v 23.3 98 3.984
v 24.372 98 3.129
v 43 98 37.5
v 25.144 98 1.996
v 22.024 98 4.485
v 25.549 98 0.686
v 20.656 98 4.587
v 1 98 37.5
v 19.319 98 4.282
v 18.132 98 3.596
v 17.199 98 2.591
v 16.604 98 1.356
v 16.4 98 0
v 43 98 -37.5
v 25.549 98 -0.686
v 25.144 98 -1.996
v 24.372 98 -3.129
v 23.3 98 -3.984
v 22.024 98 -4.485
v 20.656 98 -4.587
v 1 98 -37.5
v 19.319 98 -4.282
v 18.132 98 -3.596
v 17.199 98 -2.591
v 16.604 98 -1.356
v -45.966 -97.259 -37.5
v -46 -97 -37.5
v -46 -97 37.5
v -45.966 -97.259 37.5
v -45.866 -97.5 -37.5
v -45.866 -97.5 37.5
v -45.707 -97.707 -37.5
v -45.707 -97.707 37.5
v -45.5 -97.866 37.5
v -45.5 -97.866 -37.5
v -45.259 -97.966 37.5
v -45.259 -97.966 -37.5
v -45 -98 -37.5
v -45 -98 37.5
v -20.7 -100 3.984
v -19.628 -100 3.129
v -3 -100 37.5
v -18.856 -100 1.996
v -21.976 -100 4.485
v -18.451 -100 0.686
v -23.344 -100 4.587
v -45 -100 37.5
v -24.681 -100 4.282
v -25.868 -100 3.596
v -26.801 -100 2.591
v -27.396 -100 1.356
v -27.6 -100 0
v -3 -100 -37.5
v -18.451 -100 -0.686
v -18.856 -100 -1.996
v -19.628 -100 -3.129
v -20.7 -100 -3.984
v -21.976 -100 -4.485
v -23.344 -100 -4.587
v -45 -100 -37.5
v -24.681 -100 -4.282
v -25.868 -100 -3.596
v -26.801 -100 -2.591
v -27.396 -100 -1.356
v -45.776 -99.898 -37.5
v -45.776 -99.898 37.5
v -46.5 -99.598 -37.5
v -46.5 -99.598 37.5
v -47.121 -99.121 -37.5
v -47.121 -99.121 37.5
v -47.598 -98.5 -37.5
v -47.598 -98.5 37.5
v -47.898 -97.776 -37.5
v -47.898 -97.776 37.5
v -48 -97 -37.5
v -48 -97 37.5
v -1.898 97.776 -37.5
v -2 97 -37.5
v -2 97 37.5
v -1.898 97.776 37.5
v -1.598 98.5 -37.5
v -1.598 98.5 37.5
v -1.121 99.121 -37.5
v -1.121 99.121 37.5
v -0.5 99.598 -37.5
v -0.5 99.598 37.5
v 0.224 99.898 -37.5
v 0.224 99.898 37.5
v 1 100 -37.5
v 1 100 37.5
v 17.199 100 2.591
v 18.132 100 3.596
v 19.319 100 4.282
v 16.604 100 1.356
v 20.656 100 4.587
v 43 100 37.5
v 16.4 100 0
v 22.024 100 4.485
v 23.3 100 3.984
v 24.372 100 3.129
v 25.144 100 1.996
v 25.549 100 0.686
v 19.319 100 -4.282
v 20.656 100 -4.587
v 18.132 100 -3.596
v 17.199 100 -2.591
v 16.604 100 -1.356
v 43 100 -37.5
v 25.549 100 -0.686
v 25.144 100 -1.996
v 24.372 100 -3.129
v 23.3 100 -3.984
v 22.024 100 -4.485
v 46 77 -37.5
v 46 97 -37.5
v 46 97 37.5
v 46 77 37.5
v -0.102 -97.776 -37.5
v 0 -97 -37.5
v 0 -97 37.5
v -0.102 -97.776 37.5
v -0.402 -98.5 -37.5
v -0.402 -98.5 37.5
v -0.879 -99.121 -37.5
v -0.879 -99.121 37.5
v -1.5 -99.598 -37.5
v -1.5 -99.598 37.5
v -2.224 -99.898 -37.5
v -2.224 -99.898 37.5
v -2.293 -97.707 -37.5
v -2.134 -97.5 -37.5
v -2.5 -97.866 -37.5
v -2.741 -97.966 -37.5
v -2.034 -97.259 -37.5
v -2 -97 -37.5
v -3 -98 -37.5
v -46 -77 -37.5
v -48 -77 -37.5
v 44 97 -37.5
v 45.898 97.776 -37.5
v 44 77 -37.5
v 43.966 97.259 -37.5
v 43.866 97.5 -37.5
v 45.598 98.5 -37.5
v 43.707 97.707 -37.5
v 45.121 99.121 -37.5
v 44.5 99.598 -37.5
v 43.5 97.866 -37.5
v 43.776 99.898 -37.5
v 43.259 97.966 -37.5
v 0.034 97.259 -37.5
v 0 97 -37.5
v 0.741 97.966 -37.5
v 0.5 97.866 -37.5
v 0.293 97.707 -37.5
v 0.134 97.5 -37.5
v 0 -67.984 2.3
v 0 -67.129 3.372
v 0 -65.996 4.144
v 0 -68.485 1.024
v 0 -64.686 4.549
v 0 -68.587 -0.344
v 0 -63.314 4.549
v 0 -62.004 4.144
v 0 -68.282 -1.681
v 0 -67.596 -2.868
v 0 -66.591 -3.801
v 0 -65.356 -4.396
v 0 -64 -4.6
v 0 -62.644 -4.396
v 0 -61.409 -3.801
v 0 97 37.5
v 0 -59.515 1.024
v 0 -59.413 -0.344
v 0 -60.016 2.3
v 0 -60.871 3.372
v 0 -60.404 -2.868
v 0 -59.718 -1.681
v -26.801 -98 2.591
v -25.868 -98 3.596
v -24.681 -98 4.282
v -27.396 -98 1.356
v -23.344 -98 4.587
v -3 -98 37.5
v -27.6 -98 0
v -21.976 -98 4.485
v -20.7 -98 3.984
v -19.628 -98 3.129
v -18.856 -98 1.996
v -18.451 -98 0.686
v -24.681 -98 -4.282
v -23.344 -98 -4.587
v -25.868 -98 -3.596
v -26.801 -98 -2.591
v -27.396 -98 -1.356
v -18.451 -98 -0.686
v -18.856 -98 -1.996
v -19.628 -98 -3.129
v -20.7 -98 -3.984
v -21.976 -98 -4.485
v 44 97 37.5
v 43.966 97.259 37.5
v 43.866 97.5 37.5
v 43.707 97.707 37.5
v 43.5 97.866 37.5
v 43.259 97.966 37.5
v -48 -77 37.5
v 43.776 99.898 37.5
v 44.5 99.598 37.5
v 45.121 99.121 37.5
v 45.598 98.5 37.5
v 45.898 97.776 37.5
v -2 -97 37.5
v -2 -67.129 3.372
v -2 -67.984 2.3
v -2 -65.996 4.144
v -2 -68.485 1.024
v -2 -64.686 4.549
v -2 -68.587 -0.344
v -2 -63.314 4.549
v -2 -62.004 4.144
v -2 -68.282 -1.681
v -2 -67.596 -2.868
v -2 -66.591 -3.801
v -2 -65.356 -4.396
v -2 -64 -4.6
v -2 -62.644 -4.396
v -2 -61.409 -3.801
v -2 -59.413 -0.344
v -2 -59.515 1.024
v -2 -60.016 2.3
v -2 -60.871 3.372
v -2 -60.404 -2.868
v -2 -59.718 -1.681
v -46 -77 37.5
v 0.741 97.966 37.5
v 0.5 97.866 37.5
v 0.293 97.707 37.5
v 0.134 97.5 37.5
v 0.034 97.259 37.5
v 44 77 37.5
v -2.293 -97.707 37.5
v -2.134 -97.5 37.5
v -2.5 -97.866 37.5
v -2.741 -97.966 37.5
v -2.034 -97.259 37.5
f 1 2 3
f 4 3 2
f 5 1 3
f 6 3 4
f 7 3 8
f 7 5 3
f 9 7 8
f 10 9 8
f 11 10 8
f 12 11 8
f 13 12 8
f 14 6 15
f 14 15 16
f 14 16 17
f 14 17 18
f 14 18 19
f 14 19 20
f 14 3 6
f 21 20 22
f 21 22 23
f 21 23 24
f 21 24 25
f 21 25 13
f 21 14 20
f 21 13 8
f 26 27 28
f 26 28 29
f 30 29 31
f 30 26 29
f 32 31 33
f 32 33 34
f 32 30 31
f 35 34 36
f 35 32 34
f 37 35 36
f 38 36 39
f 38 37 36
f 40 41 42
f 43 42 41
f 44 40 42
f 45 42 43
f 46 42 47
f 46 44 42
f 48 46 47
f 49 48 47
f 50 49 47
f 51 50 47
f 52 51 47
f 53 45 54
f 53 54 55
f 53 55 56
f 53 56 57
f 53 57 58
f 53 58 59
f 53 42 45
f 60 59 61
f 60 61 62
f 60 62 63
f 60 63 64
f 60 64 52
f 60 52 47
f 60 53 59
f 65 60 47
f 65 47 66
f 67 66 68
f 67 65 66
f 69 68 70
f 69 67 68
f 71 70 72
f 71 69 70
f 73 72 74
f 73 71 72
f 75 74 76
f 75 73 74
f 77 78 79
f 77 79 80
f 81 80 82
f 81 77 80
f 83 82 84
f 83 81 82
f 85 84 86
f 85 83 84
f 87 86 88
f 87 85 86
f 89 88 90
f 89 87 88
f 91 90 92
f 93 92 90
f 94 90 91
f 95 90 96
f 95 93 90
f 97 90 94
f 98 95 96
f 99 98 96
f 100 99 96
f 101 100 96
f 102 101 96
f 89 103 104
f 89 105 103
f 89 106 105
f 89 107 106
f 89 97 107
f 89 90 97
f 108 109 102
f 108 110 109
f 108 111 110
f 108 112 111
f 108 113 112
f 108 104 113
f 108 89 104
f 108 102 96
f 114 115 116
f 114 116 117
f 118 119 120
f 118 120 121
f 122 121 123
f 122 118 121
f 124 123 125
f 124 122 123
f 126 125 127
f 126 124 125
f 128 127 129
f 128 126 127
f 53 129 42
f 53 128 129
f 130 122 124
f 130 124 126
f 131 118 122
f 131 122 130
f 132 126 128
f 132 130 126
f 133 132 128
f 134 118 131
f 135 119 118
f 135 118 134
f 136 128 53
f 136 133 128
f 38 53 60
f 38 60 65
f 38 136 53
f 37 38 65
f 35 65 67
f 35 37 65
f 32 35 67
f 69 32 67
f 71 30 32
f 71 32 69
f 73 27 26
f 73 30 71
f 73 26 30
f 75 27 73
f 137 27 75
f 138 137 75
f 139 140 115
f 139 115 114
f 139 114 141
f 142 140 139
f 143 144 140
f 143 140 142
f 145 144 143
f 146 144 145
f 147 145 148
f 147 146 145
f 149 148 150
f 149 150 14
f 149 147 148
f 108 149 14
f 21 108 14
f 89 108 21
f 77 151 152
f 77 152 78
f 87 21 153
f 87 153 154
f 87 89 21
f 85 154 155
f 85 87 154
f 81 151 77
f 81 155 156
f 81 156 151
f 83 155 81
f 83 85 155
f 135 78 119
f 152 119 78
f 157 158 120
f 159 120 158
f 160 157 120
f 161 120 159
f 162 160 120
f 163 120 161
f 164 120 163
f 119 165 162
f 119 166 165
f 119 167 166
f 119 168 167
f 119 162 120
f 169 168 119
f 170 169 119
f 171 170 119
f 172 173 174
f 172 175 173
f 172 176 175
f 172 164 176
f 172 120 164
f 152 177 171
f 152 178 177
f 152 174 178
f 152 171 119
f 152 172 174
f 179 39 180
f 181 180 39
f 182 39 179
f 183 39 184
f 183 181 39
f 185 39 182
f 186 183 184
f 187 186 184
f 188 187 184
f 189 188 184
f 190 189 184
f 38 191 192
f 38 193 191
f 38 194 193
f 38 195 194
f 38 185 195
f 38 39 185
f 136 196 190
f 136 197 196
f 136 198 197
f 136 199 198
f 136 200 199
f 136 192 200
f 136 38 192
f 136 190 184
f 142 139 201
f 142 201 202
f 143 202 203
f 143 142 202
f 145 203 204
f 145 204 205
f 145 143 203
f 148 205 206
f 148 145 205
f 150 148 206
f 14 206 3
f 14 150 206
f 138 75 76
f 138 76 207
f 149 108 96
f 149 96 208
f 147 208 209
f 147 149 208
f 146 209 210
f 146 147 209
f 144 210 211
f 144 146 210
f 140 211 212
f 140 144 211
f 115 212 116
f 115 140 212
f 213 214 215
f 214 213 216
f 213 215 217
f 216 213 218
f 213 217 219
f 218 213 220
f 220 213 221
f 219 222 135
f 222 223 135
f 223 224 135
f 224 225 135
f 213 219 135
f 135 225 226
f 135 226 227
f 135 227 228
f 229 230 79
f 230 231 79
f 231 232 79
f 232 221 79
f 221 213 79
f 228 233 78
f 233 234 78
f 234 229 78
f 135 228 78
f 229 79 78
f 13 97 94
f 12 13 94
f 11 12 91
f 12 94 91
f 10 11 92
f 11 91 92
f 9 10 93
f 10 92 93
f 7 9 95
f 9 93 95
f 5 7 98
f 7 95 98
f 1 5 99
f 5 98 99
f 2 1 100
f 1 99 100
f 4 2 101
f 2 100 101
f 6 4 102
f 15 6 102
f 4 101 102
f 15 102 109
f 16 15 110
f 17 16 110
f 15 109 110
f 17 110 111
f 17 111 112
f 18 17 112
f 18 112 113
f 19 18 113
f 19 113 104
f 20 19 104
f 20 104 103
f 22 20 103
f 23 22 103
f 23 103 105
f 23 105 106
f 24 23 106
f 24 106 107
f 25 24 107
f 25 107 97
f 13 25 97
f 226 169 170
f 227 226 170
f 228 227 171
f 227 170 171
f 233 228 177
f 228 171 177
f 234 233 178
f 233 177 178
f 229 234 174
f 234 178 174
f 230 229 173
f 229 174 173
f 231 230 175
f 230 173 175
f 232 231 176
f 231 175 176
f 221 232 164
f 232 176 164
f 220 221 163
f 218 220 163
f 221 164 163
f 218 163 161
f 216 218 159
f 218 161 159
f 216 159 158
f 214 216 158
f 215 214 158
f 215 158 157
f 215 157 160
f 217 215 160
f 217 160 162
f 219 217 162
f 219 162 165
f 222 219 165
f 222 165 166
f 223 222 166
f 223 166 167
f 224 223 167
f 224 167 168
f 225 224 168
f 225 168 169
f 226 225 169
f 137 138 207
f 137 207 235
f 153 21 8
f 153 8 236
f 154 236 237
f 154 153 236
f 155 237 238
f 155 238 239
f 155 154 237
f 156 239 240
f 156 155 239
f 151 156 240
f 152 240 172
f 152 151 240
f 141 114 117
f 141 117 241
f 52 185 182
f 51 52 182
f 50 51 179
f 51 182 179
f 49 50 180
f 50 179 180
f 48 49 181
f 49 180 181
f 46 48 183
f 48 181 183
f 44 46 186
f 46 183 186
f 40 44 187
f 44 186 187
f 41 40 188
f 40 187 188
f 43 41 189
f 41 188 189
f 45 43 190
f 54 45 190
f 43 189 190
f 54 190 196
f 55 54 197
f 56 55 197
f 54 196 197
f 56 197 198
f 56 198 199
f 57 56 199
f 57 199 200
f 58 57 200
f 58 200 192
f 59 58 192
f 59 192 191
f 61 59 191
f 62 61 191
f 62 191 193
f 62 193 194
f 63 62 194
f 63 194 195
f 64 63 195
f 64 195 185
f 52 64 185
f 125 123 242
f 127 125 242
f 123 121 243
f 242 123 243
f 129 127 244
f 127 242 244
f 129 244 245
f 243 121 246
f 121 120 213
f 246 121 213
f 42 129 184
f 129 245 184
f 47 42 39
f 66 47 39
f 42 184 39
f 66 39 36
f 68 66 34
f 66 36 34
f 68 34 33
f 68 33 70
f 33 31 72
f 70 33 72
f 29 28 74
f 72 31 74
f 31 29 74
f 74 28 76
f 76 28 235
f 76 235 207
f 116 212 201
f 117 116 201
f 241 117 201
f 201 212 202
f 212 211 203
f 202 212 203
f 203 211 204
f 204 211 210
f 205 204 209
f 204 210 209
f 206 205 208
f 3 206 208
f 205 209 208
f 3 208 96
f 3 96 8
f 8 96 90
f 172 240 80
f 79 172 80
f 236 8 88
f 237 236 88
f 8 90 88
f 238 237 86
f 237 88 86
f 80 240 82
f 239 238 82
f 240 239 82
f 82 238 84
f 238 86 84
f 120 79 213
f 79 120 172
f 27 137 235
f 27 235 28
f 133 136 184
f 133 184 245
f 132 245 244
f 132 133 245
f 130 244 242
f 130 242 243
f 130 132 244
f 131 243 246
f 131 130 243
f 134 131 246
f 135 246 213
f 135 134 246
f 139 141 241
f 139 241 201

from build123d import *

# Parameters (mm, degrees)
SKETCH1_W                      = 75
SKETCH1_H                      = 200
BASE_FLANGE1_DEPTH             = 2
EDGE_FLANGE1_STRIP_W           = 10
EDGE_FLANGE1_STRIP_H           = 2
EDGE_FLANGE1_STRIP_CUT_DEPTH   = 75
EDGE_FLANGE1_STRIP_2_W         = 10
EDGE_FLANGE1_STRIP_2_H         = 2
EDGE_FLANGE1_STRIP_CUT_2_DEPTH = 75
EDGE_FLANGE1_DEPTH             = 75
EDGE_FLANGE1_BEND_DEPTH        = 75
EDGE_FLANGE2_STRIP_W           = 10
EDGE_FLANGE2_STRIP_H           = 2
EDGE_FLANGE2_STRIP_CUT_DEPTH   = 75
EDGE_FLANGE2_STRIP_2_W         = 10
EDGE_FLANGE2_STRIP_2_H         = 2
EDGE_FLANGE2_STRIP_CUT_2_DEPTH = 75
EDGE_FLANGE2_DEPTH             = 75
EDGE_FLANGE2_BEND_DEPTH        = 75
SKETCH18_R                     = 4.6
CUT_EXTRUDE1_DEPTH             = 10
SKETCH19_R                     = 4.6
CUT_EXTRUDE2_DEPTH             = 10
SKETCH20_R                     = 4.6
CUT_EXTRUDE3_DEPTH             = 10


# Sheet-metal steps are written as plain solids
with BuildPart() as part:
    # Sketch1 → Base-Flange1 (new body)
    with BuildSketch(Plane(origin=(0, 0, 0), x_dir=(0, 0, -1), z_dir=(1, 0, 0))):
        Rectangle(SKETCH1_W, SKETCH1_H)
    extrude(amount=-BASE_FLANGE1_DEPTH)

    # Edge-Flange1 strip (across the edge) → Edge-Flange1 strip cut (cut)
    with BuildSketch(Plane(origin=(0, 100, -37.5), x_dir=(0, -1, 0), z_dir=(0, 0, 1))):
        with Locations((-2, -1)):
            Rectangle(EDGE_FLANGE1_STRIP_W, EDGE_FLANGE1_STRIP_H)
    extrude(amount=EDGE_FLANGE1_STRIP_CUT_DEPTH, mode=Mode.SUBTRACT)

    # Edge-Flange1 strip 2 (across the edge) → Edge-Flange1 strip cut 2 (cut)
    with BuildSketch(Plane(origin=(-2, -100, -37.5), x_dir=(0, 1, 0), z_dir=(0, 0, 1))):
        with Locations((-2, -1)):
            Rectangle(EDGE_FLANGE1_STRIP_2_W, EDGE_FLANGE1_STRIP_2_H)
    extrude(amount=EDGE_FLANGE1_STRIP_CUT_2_DEPTH, mode=Mode.SUBTRACT)

    # Edge-Flange1 section (across the edge) → Edge-Flange1 (add)
    with BuildSketch(Plane(origin=(0, 100, -37.5), x_dir=(0, -1, 0), z_dir=(0, 0, 1))):
        with BuildLine():
            Line((0, 1), (0, 46))
            Line((0, 46), (2, 46))
            Line((2, 46), (2, 1))
            ThreePointArc((2, 1), (2.292893219, 0.292893219), (3, 0))
            Line((3, 0), (3, -2))
            ThreePointArc((3, -2), (0.878679656, -1.121320344), (0, 1))
        make_face()
    extrude(amount=EDGE_FLANGE1_DEPTH)

    # Edge-Flange1 section 2 (across the edge) → Edge-Flange1 bend (add)
    with BuildSketch(Plane(origin=(-2, -100, -37.5), x_dir=(0, 1, 0), z_dir=(0, 0, 1))):
        with BuildLine():
            Line((0, 1), (0, 46))
            Line((0, 46), (2, 46))
            Line((2, 46), (2, 1))
            ThreePointArc((2, 1), (2.292893219, 0.292893219), (3, 0))
            Line((3, 0), (3, -2))
            ThreePointArc((3, -2), (0.878679656, -1.121320344), (0, 1))
        make_face()
    extrude(amount=EDGE_FLANGE1_BEND_DEPTH)

    # Edge-Flange2 strip (across the edge) → Edge-Flange2 strip cut (cut)
    with BuildSketch(Plane(origin=(46, 98, -37.5), x_dir=(-1, 0, 0), z_dir=(0, 0, 1))):
        with Locations((-2, -1)):
            Rectangle(EDGE_FLANGE2_STRIP_W, EDGE_FLANGE2_STRIP_H)
    extrude(amount=EDGE_FLANGE2_STRIP_CUT_DEPTH, mode=Mode.SUBTRACT)

    # Edge-Flange2 strip 2 (across the edge) → Edge-Flange2 strip cut 2 (cut)
    with BuildSketch(Plane(origin=(-48, -98, -37.5), x_dir=(1, 0, 0), z_dir=(0, 0, 1))):
        with Locations((-2, -1)):
            Rectangle(EDGE_FLANGE2_STRIP_2_W, EDGE_FLANGE2_STRIP_2_H)
    extrude(amount=EDGE_FLANGE2_STRIP_CUT_2_DEPTH, mode=Mode.SUBTRACT)

    # Edge-Flange2 section (across the edge) → Edge-Flange2 (add)
    with BuildSketch(Plane(origin=(46, 98, -37.5), x_dir=(-1, 0, 0), z_dir=(0, 0, 1))):
        with BuildLine():
            Line((0, 1), (0, 21))
            Line((0, 21), (2, 21))
            Line((2, 21), (2, 1))
            ThreePointArc((2, 1), (2.292893219, 0.292893219), (3, 0))
            Line((3, 0), (3, -2))
            ThreePointArc((3, -2), (0.878679656, -1.121320344), (0, 1))
        make_face()
    extrude(amount=EDGE_FLANGE2_DEPTH)

    # Edge-Flange2 section 2 (across the edge) → Edge-Flange2 bend (add)
    with BuildSketch(Plane(origin=(-48, -98, -37.5), x_dir=(1, 0, 0), z_dir=(0, 0, 1))):
        with BuildLine():
            Line((0, 1), (0, 21))
            Line((0, 21), (2, 21))
            Line((2, 21), (2, 1))
            ThreePointArc((2, 1), (2.292893219, 0.292893219), (3, 0))
            Line((3, 0), (3, -2))
            ThreePointArc((3, -2), (0.878679656, -1.121320344), (0, 1))
        make_face()
    extrude(amount=EDGE_FLANGE2_BEND_DEPTH)

    # Sketch18 → Cut-Extrude1 (cut)
    with BuildSketch(Plane(origin=(0, 100, 0), x_dir=(1, 0, 0), z_dir=(0, 1, 0))):
        with Locations(Location((21, 0, 0), (0, 0, 180))):
            Circle(SKETCH18_R)
    extrude(amount=-CUT_EXTRUDE1_DEPTH, mode=Mode.SUBTRACT)

    # Sketch19 → Cut-Extrude2 (cut)
    with BuildSketch(Plane(origin=(0, -98, 0), x_dir=(1, 0, 0), z_dir=(0, 1, 0))):
        with Locations(Location((-23, 0, 0), (0, 0, 180))):
            Circle(SKETCH19_R)
    extrude(amount=-CUT_EXTRUDE2_DEPTH, mode=Mode.SUBTRACT)

    # Sketch20 → Cut-Extrude3 (cut)
    with BuildSketch(Plane(origin=(0, 0, 0), x_dir=(0, 0, -1), z_dir=(1, 0, 0))):
        with Locations((0, -64)):
            Circle(SKETCH20_R)
    extrude(amount=-CUT_EXTRUDE3_DEPTH, mode=Mode.SUBTRACT)


solid = part.part
